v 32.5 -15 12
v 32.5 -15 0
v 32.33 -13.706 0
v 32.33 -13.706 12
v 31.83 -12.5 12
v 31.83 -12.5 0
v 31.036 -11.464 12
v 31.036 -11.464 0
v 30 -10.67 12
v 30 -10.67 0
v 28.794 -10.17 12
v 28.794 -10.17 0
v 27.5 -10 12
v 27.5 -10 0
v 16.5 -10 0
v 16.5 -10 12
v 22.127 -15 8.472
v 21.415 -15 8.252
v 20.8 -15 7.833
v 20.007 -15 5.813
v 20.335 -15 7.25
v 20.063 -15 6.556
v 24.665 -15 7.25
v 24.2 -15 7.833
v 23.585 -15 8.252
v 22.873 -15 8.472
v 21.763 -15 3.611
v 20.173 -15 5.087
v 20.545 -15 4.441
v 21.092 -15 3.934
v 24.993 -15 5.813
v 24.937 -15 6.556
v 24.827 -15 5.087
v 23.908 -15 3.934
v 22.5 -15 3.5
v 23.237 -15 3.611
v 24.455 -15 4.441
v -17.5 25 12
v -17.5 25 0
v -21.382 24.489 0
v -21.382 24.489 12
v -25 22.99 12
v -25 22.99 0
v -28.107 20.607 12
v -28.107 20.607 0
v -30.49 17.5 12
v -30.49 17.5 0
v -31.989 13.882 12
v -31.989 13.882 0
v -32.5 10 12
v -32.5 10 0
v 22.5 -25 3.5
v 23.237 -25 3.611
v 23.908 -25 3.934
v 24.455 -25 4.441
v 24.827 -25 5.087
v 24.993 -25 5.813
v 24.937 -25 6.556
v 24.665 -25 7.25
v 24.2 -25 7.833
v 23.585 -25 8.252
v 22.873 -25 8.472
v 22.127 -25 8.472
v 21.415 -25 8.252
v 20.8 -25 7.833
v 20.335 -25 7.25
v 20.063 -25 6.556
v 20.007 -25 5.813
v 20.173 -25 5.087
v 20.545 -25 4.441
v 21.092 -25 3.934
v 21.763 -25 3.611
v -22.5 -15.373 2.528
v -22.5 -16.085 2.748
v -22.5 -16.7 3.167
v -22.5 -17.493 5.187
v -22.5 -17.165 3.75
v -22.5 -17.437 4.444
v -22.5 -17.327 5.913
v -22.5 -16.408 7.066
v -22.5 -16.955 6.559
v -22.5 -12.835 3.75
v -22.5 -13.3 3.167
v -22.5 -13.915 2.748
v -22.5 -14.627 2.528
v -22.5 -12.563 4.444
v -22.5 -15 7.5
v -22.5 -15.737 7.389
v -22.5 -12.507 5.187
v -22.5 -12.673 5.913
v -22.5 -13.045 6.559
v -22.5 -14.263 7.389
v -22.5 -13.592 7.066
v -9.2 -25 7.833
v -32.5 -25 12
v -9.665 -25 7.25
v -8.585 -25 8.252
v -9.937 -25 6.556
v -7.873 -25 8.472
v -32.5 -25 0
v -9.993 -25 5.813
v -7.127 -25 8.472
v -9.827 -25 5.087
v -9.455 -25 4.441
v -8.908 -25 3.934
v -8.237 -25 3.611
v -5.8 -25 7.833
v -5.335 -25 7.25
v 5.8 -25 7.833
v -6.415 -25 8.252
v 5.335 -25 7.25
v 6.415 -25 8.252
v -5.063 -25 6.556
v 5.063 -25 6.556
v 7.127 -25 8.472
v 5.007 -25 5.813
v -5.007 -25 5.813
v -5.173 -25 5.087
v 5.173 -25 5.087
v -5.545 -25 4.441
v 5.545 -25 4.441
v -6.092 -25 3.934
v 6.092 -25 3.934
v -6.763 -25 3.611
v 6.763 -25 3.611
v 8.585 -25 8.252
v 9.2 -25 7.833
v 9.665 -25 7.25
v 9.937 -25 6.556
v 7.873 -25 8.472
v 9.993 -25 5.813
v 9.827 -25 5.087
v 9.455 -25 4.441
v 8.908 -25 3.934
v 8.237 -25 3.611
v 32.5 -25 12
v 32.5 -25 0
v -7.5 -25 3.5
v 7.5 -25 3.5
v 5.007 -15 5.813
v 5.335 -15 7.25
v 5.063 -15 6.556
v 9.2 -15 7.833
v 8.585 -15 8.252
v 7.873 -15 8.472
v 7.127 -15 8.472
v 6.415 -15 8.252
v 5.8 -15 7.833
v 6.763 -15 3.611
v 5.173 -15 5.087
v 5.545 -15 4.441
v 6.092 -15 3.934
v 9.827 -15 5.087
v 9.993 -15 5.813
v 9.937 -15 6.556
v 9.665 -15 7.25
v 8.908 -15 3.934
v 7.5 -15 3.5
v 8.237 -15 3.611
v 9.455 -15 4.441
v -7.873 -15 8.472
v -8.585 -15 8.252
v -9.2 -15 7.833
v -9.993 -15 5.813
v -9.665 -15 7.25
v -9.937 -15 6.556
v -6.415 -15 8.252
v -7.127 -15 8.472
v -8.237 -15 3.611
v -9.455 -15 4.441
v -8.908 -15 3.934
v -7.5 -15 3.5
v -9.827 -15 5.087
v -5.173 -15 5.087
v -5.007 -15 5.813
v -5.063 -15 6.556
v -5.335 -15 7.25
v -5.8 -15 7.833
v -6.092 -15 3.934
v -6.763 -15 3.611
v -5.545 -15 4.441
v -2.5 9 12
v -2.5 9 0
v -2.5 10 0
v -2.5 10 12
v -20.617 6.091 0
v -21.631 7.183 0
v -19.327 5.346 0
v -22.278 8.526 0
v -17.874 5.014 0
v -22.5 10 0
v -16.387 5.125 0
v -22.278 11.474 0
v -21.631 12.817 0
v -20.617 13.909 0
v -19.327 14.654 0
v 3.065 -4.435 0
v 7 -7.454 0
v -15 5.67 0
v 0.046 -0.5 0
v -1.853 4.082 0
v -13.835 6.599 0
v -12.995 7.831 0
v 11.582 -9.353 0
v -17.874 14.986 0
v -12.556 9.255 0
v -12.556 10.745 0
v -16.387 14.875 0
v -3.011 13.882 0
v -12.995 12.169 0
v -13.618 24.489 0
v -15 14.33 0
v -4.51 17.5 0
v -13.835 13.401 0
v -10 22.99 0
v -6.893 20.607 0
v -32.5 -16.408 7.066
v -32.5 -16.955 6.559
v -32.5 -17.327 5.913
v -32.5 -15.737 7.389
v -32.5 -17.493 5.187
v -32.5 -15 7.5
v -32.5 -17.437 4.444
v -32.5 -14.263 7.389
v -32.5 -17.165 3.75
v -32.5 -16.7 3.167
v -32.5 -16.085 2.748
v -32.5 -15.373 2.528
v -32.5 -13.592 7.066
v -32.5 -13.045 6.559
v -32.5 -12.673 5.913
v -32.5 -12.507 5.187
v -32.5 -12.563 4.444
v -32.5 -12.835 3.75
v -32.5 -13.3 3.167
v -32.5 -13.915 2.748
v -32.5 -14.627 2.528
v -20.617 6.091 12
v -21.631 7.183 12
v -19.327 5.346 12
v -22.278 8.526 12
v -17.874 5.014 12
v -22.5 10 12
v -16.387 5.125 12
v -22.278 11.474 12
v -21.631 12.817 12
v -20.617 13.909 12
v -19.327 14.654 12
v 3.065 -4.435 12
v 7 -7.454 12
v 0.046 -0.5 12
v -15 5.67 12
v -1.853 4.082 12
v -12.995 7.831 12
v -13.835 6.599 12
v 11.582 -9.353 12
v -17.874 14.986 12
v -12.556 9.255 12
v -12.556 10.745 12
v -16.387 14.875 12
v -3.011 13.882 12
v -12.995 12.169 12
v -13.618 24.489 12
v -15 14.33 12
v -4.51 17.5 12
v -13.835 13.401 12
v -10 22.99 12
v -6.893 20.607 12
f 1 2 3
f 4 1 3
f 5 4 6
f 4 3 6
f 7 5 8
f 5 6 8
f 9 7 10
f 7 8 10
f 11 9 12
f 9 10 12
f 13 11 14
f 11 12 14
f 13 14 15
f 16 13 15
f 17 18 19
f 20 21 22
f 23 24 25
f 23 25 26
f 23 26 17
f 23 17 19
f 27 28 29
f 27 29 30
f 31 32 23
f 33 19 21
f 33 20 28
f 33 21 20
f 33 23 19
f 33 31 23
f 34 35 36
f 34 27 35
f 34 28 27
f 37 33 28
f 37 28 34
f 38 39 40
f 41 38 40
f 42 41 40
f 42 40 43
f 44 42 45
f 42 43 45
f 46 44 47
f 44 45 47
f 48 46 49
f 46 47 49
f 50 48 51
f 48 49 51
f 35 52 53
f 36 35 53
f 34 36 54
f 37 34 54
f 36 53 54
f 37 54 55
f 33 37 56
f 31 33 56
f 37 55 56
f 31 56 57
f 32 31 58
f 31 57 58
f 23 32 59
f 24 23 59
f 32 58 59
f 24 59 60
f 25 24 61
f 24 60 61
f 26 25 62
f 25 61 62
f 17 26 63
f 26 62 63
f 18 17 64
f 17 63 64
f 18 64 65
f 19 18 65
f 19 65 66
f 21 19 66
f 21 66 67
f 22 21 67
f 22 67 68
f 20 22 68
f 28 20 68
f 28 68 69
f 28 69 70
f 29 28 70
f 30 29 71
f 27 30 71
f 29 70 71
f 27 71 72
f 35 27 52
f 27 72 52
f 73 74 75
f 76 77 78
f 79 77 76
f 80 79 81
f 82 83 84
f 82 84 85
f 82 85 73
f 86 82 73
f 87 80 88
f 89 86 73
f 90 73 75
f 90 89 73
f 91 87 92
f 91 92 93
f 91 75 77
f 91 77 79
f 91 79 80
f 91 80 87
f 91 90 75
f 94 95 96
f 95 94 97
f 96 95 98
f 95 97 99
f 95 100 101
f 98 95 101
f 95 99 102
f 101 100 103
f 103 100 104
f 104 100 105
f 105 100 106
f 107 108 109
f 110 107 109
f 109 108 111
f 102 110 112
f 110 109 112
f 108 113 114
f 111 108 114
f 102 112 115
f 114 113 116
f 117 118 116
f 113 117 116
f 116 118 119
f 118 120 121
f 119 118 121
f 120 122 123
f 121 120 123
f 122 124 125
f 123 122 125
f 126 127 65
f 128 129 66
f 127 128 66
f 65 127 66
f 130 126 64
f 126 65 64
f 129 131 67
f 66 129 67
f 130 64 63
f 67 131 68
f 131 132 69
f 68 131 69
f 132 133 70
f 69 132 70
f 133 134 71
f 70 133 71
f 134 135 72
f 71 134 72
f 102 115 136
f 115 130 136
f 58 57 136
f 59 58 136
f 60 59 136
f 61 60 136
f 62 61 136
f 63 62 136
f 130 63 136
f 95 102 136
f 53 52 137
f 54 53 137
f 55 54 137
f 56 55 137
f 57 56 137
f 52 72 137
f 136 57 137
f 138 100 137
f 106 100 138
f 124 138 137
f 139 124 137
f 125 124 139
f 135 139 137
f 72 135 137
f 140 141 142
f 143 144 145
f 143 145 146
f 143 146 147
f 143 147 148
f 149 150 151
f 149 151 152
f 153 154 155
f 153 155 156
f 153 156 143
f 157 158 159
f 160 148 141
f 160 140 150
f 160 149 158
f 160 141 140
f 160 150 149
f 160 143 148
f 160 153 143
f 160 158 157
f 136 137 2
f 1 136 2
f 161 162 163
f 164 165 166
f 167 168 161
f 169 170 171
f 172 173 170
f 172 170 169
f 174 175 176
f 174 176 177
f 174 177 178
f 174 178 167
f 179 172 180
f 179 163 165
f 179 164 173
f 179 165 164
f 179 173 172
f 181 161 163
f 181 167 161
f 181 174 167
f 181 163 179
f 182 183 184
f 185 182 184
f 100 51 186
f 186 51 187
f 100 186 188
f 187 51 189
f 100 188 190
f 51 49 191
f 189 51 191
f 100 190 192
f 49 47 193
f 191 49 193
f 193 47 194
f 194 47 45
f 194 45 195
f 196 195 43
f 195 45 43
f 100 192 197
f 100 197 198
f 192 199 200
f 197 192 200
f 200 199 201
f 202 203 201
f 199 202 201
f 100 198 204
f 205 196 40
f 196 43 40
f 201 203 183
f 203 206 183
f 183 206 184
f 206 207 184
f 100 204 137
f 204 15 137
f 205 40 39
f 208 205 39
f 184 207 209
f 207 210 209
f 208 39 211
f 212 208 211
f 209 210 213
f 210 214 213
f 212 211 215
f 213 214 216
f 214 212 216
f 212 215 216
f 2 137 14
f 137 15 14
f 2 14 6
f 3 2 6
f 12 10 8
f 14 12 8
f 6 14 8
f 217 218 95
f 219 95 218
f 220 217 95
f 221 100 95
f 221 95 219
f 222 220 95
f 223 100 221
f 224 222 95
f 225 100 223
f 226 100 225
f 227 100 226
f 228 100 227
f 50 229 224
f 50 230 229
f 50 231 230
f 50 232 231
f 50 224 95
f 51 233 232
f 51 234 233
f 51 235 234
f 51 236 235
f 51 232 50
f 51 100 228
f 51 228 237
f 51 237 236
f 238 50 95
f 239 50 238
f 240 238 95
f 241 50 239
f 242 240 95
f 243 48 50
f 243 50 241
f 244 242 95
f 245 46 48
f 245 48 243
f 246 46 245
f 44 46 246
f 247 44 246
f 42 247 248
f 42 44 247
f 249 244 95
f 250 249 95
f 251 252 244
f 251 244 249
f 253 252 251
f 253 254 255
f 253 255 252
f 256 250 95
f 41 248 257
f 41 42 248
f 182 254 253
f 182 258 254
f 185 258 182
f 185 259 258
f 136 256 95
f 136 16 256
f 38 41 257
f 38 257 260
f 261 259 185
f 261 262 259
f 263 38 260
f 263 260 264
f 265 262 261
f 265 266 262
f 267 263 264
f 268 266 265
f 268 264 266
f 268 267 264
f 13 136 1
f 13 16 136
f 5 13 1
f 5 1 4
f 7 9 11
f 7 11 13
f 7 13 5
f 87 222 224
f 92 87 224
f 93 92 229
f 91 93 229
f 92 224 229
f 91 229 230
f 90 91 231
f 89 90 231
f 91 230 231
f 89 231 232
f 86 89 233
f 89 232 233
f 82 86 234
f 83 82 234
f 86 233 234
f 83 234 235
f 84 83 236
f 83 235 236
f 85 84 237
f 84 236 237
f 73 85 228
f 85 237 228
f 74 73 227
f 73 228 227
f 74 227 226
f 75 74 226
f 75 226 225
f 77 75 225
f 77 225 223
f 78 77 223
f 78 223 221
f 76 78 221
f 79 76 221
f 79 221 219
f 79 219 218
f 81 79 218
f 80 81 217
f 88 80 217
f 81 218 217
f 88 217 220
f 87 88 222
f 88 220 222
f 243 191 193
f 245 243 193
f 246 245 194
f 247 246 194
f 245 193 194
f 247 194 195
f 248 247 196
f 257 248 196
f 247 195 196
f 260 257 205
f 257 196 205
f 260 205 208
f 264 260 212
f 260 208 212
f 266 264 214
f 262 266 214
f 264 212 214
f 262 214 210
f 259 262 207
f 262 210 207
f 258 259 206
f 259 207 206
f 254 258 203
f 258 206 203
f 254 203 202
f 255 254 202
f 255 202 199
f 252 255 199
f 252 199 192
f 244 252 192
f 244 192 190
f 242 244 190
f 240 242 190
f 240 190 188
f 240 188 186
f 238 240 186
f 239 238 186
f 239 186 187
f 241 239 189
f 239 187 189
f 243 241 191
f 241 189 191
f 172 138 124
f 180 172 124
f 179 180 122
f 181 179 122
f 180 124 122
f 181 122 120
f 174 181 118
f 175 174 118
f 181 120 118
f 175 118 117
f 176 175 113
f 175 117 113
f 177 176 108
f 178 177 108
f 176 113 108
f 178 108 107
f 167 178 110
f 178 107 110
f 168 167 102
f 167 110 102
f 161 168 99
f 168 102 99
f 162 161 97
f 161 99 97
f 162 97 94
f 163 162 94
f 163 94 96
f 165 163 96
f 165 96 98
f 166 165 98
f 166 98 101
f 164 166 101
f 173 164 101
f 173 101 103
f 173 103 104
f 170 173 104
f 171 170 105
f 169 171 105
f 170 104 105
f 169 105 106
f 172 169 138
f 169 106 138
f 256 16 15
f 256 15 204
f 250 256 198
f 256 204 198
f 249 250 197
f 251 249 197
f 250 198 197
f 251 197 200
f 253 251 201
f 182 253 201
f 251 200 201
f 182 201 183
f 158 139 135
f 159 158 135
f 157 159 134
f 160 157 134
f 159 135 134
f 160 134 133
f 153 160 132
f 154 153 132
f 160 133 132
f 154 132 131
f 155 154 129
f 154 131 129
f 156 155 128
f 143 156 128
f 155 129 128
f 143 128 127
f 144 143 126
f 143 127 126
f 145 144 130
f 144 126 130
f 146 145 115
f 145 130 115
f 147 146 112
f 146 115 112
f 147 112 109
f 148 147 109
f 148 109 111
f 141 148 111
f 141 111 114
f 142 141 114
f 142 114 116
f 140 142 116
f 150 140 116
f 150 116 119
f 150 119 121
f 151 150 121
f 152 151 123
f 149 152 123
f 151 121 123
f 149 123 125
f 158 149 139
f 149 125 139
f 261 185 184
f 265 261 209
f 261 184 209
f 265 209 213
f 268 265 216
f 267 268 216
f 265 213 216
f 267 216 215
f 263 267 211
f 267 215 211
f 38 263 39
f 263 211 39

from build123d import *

# Parameters (mm, degrees)
SKETCH_1_W          = 65
SKETCH_1_H          = 50
EXTRUDE_1_DEPTH     = 12
SKETCH_2_R          = 2.5
CUT_EXTRUDE_1_DEPTH = 10
CUT_EXTRUDE_2_DEPTH = 12
SKETCH_4_R          = 5
CUT_EXTRUDE_3_DEPTH = 12
SKETCH_5_R          = 2.5
CUT_EXTRUDE_4_DEPTH = 10


with BuildPart() as part:
    # 草图1 → 凸台-拉伸1 (new body)
    with BuildSketch(Plane.XY):
        Rectangle(SKETCH_1_W, SKETCH_1_H)
    extrude(amount=EXTRUDE_1_DEPTH)

    # 草图2 → 切除-拉伸1 (cut)
    with BuildSketch(Plane(origin=(0, -25, 0), x_dir=(-1, 0, 0), z_dir=(0, -1, 0))):
        with Locations(Location((7.5, -6, 0), (0, 0, 90))):
            Circle(SKETCH_2_R)
        with Locations(Location((-7.5, -6, 0), (0, 0, 90))):
            Circle(SKETCH_2_R)
        with Locations(Location((-22.5, -6, 0), (0, 0, 90))):
            Circle(SKETCH_2_R)
    extrude(amount=-CUT_EXTRUDE_1_DEPTH, mode=Mode.SUBTRACT)

    # 草图3 → 切除-拉伸2 (cut)
    with BuildSketch(Plane(origin=(0, 0, 0), x_dir=(-1, 0, 0), z_dir=(0, 0, -1))):
        with BuildLine():
            ThreePointArc((-32.5, -15), (-31.035533906, -11.464466094), (-27.5, -10))
            Line((-27.5, -10), (-16.5, -10))
            ThreePointArc((-16.5, -10), (-3.064971157, -4.435028843), (2.5, 9))
            Line((2.5, 9), (2.5, 10))
            ThreePointArc((2.5, 10), (6.893398271, 20.606601706), (17.499999967, 25))
            Line((17.499999967, 25), (-32.5, 25))
            Line((-32.5, 25), (-32.5, -15))
        make_face()
        with BuildLine():
            Line((32.5, 25), (17.499999967, 25))
            ThreePointArc((17.499999967, 25), (28.106601706, 20.606601729), (32.5, 10))
            Line((32.5, 10), (32.5, 25))
        make_face()
    extrude(amount=-CUT_EXTRUDE_2_DEPTH, mode=Mode.SUBTRACT)

    # 草图4 → 切除-拉伸3 (cut)
    with BuildSketch(Plane(origin=(0, 0, 0), x_dir=(-1, 0, 0), z_dir=(0, 0, -1))):
        with Locations((17.5, 10)):
            Circle(SKETCH_4_R)
    extrude(amount=-CUT_EXTRUDE_3_DEPTH, mode=Mode.SUBTRACT)

    # 草图5 → 切除-拉伸4 (cut)
    with BuildSketch(Plane.ZY.offset(32.5)):
        with Locations((5, -15)):
            Circle(SKETCH_5_R)
    extrude(amount=-CUT_EXTRUDE_4_DEPTH, mode=Mode.SUBTRACT)


solid = part.part
